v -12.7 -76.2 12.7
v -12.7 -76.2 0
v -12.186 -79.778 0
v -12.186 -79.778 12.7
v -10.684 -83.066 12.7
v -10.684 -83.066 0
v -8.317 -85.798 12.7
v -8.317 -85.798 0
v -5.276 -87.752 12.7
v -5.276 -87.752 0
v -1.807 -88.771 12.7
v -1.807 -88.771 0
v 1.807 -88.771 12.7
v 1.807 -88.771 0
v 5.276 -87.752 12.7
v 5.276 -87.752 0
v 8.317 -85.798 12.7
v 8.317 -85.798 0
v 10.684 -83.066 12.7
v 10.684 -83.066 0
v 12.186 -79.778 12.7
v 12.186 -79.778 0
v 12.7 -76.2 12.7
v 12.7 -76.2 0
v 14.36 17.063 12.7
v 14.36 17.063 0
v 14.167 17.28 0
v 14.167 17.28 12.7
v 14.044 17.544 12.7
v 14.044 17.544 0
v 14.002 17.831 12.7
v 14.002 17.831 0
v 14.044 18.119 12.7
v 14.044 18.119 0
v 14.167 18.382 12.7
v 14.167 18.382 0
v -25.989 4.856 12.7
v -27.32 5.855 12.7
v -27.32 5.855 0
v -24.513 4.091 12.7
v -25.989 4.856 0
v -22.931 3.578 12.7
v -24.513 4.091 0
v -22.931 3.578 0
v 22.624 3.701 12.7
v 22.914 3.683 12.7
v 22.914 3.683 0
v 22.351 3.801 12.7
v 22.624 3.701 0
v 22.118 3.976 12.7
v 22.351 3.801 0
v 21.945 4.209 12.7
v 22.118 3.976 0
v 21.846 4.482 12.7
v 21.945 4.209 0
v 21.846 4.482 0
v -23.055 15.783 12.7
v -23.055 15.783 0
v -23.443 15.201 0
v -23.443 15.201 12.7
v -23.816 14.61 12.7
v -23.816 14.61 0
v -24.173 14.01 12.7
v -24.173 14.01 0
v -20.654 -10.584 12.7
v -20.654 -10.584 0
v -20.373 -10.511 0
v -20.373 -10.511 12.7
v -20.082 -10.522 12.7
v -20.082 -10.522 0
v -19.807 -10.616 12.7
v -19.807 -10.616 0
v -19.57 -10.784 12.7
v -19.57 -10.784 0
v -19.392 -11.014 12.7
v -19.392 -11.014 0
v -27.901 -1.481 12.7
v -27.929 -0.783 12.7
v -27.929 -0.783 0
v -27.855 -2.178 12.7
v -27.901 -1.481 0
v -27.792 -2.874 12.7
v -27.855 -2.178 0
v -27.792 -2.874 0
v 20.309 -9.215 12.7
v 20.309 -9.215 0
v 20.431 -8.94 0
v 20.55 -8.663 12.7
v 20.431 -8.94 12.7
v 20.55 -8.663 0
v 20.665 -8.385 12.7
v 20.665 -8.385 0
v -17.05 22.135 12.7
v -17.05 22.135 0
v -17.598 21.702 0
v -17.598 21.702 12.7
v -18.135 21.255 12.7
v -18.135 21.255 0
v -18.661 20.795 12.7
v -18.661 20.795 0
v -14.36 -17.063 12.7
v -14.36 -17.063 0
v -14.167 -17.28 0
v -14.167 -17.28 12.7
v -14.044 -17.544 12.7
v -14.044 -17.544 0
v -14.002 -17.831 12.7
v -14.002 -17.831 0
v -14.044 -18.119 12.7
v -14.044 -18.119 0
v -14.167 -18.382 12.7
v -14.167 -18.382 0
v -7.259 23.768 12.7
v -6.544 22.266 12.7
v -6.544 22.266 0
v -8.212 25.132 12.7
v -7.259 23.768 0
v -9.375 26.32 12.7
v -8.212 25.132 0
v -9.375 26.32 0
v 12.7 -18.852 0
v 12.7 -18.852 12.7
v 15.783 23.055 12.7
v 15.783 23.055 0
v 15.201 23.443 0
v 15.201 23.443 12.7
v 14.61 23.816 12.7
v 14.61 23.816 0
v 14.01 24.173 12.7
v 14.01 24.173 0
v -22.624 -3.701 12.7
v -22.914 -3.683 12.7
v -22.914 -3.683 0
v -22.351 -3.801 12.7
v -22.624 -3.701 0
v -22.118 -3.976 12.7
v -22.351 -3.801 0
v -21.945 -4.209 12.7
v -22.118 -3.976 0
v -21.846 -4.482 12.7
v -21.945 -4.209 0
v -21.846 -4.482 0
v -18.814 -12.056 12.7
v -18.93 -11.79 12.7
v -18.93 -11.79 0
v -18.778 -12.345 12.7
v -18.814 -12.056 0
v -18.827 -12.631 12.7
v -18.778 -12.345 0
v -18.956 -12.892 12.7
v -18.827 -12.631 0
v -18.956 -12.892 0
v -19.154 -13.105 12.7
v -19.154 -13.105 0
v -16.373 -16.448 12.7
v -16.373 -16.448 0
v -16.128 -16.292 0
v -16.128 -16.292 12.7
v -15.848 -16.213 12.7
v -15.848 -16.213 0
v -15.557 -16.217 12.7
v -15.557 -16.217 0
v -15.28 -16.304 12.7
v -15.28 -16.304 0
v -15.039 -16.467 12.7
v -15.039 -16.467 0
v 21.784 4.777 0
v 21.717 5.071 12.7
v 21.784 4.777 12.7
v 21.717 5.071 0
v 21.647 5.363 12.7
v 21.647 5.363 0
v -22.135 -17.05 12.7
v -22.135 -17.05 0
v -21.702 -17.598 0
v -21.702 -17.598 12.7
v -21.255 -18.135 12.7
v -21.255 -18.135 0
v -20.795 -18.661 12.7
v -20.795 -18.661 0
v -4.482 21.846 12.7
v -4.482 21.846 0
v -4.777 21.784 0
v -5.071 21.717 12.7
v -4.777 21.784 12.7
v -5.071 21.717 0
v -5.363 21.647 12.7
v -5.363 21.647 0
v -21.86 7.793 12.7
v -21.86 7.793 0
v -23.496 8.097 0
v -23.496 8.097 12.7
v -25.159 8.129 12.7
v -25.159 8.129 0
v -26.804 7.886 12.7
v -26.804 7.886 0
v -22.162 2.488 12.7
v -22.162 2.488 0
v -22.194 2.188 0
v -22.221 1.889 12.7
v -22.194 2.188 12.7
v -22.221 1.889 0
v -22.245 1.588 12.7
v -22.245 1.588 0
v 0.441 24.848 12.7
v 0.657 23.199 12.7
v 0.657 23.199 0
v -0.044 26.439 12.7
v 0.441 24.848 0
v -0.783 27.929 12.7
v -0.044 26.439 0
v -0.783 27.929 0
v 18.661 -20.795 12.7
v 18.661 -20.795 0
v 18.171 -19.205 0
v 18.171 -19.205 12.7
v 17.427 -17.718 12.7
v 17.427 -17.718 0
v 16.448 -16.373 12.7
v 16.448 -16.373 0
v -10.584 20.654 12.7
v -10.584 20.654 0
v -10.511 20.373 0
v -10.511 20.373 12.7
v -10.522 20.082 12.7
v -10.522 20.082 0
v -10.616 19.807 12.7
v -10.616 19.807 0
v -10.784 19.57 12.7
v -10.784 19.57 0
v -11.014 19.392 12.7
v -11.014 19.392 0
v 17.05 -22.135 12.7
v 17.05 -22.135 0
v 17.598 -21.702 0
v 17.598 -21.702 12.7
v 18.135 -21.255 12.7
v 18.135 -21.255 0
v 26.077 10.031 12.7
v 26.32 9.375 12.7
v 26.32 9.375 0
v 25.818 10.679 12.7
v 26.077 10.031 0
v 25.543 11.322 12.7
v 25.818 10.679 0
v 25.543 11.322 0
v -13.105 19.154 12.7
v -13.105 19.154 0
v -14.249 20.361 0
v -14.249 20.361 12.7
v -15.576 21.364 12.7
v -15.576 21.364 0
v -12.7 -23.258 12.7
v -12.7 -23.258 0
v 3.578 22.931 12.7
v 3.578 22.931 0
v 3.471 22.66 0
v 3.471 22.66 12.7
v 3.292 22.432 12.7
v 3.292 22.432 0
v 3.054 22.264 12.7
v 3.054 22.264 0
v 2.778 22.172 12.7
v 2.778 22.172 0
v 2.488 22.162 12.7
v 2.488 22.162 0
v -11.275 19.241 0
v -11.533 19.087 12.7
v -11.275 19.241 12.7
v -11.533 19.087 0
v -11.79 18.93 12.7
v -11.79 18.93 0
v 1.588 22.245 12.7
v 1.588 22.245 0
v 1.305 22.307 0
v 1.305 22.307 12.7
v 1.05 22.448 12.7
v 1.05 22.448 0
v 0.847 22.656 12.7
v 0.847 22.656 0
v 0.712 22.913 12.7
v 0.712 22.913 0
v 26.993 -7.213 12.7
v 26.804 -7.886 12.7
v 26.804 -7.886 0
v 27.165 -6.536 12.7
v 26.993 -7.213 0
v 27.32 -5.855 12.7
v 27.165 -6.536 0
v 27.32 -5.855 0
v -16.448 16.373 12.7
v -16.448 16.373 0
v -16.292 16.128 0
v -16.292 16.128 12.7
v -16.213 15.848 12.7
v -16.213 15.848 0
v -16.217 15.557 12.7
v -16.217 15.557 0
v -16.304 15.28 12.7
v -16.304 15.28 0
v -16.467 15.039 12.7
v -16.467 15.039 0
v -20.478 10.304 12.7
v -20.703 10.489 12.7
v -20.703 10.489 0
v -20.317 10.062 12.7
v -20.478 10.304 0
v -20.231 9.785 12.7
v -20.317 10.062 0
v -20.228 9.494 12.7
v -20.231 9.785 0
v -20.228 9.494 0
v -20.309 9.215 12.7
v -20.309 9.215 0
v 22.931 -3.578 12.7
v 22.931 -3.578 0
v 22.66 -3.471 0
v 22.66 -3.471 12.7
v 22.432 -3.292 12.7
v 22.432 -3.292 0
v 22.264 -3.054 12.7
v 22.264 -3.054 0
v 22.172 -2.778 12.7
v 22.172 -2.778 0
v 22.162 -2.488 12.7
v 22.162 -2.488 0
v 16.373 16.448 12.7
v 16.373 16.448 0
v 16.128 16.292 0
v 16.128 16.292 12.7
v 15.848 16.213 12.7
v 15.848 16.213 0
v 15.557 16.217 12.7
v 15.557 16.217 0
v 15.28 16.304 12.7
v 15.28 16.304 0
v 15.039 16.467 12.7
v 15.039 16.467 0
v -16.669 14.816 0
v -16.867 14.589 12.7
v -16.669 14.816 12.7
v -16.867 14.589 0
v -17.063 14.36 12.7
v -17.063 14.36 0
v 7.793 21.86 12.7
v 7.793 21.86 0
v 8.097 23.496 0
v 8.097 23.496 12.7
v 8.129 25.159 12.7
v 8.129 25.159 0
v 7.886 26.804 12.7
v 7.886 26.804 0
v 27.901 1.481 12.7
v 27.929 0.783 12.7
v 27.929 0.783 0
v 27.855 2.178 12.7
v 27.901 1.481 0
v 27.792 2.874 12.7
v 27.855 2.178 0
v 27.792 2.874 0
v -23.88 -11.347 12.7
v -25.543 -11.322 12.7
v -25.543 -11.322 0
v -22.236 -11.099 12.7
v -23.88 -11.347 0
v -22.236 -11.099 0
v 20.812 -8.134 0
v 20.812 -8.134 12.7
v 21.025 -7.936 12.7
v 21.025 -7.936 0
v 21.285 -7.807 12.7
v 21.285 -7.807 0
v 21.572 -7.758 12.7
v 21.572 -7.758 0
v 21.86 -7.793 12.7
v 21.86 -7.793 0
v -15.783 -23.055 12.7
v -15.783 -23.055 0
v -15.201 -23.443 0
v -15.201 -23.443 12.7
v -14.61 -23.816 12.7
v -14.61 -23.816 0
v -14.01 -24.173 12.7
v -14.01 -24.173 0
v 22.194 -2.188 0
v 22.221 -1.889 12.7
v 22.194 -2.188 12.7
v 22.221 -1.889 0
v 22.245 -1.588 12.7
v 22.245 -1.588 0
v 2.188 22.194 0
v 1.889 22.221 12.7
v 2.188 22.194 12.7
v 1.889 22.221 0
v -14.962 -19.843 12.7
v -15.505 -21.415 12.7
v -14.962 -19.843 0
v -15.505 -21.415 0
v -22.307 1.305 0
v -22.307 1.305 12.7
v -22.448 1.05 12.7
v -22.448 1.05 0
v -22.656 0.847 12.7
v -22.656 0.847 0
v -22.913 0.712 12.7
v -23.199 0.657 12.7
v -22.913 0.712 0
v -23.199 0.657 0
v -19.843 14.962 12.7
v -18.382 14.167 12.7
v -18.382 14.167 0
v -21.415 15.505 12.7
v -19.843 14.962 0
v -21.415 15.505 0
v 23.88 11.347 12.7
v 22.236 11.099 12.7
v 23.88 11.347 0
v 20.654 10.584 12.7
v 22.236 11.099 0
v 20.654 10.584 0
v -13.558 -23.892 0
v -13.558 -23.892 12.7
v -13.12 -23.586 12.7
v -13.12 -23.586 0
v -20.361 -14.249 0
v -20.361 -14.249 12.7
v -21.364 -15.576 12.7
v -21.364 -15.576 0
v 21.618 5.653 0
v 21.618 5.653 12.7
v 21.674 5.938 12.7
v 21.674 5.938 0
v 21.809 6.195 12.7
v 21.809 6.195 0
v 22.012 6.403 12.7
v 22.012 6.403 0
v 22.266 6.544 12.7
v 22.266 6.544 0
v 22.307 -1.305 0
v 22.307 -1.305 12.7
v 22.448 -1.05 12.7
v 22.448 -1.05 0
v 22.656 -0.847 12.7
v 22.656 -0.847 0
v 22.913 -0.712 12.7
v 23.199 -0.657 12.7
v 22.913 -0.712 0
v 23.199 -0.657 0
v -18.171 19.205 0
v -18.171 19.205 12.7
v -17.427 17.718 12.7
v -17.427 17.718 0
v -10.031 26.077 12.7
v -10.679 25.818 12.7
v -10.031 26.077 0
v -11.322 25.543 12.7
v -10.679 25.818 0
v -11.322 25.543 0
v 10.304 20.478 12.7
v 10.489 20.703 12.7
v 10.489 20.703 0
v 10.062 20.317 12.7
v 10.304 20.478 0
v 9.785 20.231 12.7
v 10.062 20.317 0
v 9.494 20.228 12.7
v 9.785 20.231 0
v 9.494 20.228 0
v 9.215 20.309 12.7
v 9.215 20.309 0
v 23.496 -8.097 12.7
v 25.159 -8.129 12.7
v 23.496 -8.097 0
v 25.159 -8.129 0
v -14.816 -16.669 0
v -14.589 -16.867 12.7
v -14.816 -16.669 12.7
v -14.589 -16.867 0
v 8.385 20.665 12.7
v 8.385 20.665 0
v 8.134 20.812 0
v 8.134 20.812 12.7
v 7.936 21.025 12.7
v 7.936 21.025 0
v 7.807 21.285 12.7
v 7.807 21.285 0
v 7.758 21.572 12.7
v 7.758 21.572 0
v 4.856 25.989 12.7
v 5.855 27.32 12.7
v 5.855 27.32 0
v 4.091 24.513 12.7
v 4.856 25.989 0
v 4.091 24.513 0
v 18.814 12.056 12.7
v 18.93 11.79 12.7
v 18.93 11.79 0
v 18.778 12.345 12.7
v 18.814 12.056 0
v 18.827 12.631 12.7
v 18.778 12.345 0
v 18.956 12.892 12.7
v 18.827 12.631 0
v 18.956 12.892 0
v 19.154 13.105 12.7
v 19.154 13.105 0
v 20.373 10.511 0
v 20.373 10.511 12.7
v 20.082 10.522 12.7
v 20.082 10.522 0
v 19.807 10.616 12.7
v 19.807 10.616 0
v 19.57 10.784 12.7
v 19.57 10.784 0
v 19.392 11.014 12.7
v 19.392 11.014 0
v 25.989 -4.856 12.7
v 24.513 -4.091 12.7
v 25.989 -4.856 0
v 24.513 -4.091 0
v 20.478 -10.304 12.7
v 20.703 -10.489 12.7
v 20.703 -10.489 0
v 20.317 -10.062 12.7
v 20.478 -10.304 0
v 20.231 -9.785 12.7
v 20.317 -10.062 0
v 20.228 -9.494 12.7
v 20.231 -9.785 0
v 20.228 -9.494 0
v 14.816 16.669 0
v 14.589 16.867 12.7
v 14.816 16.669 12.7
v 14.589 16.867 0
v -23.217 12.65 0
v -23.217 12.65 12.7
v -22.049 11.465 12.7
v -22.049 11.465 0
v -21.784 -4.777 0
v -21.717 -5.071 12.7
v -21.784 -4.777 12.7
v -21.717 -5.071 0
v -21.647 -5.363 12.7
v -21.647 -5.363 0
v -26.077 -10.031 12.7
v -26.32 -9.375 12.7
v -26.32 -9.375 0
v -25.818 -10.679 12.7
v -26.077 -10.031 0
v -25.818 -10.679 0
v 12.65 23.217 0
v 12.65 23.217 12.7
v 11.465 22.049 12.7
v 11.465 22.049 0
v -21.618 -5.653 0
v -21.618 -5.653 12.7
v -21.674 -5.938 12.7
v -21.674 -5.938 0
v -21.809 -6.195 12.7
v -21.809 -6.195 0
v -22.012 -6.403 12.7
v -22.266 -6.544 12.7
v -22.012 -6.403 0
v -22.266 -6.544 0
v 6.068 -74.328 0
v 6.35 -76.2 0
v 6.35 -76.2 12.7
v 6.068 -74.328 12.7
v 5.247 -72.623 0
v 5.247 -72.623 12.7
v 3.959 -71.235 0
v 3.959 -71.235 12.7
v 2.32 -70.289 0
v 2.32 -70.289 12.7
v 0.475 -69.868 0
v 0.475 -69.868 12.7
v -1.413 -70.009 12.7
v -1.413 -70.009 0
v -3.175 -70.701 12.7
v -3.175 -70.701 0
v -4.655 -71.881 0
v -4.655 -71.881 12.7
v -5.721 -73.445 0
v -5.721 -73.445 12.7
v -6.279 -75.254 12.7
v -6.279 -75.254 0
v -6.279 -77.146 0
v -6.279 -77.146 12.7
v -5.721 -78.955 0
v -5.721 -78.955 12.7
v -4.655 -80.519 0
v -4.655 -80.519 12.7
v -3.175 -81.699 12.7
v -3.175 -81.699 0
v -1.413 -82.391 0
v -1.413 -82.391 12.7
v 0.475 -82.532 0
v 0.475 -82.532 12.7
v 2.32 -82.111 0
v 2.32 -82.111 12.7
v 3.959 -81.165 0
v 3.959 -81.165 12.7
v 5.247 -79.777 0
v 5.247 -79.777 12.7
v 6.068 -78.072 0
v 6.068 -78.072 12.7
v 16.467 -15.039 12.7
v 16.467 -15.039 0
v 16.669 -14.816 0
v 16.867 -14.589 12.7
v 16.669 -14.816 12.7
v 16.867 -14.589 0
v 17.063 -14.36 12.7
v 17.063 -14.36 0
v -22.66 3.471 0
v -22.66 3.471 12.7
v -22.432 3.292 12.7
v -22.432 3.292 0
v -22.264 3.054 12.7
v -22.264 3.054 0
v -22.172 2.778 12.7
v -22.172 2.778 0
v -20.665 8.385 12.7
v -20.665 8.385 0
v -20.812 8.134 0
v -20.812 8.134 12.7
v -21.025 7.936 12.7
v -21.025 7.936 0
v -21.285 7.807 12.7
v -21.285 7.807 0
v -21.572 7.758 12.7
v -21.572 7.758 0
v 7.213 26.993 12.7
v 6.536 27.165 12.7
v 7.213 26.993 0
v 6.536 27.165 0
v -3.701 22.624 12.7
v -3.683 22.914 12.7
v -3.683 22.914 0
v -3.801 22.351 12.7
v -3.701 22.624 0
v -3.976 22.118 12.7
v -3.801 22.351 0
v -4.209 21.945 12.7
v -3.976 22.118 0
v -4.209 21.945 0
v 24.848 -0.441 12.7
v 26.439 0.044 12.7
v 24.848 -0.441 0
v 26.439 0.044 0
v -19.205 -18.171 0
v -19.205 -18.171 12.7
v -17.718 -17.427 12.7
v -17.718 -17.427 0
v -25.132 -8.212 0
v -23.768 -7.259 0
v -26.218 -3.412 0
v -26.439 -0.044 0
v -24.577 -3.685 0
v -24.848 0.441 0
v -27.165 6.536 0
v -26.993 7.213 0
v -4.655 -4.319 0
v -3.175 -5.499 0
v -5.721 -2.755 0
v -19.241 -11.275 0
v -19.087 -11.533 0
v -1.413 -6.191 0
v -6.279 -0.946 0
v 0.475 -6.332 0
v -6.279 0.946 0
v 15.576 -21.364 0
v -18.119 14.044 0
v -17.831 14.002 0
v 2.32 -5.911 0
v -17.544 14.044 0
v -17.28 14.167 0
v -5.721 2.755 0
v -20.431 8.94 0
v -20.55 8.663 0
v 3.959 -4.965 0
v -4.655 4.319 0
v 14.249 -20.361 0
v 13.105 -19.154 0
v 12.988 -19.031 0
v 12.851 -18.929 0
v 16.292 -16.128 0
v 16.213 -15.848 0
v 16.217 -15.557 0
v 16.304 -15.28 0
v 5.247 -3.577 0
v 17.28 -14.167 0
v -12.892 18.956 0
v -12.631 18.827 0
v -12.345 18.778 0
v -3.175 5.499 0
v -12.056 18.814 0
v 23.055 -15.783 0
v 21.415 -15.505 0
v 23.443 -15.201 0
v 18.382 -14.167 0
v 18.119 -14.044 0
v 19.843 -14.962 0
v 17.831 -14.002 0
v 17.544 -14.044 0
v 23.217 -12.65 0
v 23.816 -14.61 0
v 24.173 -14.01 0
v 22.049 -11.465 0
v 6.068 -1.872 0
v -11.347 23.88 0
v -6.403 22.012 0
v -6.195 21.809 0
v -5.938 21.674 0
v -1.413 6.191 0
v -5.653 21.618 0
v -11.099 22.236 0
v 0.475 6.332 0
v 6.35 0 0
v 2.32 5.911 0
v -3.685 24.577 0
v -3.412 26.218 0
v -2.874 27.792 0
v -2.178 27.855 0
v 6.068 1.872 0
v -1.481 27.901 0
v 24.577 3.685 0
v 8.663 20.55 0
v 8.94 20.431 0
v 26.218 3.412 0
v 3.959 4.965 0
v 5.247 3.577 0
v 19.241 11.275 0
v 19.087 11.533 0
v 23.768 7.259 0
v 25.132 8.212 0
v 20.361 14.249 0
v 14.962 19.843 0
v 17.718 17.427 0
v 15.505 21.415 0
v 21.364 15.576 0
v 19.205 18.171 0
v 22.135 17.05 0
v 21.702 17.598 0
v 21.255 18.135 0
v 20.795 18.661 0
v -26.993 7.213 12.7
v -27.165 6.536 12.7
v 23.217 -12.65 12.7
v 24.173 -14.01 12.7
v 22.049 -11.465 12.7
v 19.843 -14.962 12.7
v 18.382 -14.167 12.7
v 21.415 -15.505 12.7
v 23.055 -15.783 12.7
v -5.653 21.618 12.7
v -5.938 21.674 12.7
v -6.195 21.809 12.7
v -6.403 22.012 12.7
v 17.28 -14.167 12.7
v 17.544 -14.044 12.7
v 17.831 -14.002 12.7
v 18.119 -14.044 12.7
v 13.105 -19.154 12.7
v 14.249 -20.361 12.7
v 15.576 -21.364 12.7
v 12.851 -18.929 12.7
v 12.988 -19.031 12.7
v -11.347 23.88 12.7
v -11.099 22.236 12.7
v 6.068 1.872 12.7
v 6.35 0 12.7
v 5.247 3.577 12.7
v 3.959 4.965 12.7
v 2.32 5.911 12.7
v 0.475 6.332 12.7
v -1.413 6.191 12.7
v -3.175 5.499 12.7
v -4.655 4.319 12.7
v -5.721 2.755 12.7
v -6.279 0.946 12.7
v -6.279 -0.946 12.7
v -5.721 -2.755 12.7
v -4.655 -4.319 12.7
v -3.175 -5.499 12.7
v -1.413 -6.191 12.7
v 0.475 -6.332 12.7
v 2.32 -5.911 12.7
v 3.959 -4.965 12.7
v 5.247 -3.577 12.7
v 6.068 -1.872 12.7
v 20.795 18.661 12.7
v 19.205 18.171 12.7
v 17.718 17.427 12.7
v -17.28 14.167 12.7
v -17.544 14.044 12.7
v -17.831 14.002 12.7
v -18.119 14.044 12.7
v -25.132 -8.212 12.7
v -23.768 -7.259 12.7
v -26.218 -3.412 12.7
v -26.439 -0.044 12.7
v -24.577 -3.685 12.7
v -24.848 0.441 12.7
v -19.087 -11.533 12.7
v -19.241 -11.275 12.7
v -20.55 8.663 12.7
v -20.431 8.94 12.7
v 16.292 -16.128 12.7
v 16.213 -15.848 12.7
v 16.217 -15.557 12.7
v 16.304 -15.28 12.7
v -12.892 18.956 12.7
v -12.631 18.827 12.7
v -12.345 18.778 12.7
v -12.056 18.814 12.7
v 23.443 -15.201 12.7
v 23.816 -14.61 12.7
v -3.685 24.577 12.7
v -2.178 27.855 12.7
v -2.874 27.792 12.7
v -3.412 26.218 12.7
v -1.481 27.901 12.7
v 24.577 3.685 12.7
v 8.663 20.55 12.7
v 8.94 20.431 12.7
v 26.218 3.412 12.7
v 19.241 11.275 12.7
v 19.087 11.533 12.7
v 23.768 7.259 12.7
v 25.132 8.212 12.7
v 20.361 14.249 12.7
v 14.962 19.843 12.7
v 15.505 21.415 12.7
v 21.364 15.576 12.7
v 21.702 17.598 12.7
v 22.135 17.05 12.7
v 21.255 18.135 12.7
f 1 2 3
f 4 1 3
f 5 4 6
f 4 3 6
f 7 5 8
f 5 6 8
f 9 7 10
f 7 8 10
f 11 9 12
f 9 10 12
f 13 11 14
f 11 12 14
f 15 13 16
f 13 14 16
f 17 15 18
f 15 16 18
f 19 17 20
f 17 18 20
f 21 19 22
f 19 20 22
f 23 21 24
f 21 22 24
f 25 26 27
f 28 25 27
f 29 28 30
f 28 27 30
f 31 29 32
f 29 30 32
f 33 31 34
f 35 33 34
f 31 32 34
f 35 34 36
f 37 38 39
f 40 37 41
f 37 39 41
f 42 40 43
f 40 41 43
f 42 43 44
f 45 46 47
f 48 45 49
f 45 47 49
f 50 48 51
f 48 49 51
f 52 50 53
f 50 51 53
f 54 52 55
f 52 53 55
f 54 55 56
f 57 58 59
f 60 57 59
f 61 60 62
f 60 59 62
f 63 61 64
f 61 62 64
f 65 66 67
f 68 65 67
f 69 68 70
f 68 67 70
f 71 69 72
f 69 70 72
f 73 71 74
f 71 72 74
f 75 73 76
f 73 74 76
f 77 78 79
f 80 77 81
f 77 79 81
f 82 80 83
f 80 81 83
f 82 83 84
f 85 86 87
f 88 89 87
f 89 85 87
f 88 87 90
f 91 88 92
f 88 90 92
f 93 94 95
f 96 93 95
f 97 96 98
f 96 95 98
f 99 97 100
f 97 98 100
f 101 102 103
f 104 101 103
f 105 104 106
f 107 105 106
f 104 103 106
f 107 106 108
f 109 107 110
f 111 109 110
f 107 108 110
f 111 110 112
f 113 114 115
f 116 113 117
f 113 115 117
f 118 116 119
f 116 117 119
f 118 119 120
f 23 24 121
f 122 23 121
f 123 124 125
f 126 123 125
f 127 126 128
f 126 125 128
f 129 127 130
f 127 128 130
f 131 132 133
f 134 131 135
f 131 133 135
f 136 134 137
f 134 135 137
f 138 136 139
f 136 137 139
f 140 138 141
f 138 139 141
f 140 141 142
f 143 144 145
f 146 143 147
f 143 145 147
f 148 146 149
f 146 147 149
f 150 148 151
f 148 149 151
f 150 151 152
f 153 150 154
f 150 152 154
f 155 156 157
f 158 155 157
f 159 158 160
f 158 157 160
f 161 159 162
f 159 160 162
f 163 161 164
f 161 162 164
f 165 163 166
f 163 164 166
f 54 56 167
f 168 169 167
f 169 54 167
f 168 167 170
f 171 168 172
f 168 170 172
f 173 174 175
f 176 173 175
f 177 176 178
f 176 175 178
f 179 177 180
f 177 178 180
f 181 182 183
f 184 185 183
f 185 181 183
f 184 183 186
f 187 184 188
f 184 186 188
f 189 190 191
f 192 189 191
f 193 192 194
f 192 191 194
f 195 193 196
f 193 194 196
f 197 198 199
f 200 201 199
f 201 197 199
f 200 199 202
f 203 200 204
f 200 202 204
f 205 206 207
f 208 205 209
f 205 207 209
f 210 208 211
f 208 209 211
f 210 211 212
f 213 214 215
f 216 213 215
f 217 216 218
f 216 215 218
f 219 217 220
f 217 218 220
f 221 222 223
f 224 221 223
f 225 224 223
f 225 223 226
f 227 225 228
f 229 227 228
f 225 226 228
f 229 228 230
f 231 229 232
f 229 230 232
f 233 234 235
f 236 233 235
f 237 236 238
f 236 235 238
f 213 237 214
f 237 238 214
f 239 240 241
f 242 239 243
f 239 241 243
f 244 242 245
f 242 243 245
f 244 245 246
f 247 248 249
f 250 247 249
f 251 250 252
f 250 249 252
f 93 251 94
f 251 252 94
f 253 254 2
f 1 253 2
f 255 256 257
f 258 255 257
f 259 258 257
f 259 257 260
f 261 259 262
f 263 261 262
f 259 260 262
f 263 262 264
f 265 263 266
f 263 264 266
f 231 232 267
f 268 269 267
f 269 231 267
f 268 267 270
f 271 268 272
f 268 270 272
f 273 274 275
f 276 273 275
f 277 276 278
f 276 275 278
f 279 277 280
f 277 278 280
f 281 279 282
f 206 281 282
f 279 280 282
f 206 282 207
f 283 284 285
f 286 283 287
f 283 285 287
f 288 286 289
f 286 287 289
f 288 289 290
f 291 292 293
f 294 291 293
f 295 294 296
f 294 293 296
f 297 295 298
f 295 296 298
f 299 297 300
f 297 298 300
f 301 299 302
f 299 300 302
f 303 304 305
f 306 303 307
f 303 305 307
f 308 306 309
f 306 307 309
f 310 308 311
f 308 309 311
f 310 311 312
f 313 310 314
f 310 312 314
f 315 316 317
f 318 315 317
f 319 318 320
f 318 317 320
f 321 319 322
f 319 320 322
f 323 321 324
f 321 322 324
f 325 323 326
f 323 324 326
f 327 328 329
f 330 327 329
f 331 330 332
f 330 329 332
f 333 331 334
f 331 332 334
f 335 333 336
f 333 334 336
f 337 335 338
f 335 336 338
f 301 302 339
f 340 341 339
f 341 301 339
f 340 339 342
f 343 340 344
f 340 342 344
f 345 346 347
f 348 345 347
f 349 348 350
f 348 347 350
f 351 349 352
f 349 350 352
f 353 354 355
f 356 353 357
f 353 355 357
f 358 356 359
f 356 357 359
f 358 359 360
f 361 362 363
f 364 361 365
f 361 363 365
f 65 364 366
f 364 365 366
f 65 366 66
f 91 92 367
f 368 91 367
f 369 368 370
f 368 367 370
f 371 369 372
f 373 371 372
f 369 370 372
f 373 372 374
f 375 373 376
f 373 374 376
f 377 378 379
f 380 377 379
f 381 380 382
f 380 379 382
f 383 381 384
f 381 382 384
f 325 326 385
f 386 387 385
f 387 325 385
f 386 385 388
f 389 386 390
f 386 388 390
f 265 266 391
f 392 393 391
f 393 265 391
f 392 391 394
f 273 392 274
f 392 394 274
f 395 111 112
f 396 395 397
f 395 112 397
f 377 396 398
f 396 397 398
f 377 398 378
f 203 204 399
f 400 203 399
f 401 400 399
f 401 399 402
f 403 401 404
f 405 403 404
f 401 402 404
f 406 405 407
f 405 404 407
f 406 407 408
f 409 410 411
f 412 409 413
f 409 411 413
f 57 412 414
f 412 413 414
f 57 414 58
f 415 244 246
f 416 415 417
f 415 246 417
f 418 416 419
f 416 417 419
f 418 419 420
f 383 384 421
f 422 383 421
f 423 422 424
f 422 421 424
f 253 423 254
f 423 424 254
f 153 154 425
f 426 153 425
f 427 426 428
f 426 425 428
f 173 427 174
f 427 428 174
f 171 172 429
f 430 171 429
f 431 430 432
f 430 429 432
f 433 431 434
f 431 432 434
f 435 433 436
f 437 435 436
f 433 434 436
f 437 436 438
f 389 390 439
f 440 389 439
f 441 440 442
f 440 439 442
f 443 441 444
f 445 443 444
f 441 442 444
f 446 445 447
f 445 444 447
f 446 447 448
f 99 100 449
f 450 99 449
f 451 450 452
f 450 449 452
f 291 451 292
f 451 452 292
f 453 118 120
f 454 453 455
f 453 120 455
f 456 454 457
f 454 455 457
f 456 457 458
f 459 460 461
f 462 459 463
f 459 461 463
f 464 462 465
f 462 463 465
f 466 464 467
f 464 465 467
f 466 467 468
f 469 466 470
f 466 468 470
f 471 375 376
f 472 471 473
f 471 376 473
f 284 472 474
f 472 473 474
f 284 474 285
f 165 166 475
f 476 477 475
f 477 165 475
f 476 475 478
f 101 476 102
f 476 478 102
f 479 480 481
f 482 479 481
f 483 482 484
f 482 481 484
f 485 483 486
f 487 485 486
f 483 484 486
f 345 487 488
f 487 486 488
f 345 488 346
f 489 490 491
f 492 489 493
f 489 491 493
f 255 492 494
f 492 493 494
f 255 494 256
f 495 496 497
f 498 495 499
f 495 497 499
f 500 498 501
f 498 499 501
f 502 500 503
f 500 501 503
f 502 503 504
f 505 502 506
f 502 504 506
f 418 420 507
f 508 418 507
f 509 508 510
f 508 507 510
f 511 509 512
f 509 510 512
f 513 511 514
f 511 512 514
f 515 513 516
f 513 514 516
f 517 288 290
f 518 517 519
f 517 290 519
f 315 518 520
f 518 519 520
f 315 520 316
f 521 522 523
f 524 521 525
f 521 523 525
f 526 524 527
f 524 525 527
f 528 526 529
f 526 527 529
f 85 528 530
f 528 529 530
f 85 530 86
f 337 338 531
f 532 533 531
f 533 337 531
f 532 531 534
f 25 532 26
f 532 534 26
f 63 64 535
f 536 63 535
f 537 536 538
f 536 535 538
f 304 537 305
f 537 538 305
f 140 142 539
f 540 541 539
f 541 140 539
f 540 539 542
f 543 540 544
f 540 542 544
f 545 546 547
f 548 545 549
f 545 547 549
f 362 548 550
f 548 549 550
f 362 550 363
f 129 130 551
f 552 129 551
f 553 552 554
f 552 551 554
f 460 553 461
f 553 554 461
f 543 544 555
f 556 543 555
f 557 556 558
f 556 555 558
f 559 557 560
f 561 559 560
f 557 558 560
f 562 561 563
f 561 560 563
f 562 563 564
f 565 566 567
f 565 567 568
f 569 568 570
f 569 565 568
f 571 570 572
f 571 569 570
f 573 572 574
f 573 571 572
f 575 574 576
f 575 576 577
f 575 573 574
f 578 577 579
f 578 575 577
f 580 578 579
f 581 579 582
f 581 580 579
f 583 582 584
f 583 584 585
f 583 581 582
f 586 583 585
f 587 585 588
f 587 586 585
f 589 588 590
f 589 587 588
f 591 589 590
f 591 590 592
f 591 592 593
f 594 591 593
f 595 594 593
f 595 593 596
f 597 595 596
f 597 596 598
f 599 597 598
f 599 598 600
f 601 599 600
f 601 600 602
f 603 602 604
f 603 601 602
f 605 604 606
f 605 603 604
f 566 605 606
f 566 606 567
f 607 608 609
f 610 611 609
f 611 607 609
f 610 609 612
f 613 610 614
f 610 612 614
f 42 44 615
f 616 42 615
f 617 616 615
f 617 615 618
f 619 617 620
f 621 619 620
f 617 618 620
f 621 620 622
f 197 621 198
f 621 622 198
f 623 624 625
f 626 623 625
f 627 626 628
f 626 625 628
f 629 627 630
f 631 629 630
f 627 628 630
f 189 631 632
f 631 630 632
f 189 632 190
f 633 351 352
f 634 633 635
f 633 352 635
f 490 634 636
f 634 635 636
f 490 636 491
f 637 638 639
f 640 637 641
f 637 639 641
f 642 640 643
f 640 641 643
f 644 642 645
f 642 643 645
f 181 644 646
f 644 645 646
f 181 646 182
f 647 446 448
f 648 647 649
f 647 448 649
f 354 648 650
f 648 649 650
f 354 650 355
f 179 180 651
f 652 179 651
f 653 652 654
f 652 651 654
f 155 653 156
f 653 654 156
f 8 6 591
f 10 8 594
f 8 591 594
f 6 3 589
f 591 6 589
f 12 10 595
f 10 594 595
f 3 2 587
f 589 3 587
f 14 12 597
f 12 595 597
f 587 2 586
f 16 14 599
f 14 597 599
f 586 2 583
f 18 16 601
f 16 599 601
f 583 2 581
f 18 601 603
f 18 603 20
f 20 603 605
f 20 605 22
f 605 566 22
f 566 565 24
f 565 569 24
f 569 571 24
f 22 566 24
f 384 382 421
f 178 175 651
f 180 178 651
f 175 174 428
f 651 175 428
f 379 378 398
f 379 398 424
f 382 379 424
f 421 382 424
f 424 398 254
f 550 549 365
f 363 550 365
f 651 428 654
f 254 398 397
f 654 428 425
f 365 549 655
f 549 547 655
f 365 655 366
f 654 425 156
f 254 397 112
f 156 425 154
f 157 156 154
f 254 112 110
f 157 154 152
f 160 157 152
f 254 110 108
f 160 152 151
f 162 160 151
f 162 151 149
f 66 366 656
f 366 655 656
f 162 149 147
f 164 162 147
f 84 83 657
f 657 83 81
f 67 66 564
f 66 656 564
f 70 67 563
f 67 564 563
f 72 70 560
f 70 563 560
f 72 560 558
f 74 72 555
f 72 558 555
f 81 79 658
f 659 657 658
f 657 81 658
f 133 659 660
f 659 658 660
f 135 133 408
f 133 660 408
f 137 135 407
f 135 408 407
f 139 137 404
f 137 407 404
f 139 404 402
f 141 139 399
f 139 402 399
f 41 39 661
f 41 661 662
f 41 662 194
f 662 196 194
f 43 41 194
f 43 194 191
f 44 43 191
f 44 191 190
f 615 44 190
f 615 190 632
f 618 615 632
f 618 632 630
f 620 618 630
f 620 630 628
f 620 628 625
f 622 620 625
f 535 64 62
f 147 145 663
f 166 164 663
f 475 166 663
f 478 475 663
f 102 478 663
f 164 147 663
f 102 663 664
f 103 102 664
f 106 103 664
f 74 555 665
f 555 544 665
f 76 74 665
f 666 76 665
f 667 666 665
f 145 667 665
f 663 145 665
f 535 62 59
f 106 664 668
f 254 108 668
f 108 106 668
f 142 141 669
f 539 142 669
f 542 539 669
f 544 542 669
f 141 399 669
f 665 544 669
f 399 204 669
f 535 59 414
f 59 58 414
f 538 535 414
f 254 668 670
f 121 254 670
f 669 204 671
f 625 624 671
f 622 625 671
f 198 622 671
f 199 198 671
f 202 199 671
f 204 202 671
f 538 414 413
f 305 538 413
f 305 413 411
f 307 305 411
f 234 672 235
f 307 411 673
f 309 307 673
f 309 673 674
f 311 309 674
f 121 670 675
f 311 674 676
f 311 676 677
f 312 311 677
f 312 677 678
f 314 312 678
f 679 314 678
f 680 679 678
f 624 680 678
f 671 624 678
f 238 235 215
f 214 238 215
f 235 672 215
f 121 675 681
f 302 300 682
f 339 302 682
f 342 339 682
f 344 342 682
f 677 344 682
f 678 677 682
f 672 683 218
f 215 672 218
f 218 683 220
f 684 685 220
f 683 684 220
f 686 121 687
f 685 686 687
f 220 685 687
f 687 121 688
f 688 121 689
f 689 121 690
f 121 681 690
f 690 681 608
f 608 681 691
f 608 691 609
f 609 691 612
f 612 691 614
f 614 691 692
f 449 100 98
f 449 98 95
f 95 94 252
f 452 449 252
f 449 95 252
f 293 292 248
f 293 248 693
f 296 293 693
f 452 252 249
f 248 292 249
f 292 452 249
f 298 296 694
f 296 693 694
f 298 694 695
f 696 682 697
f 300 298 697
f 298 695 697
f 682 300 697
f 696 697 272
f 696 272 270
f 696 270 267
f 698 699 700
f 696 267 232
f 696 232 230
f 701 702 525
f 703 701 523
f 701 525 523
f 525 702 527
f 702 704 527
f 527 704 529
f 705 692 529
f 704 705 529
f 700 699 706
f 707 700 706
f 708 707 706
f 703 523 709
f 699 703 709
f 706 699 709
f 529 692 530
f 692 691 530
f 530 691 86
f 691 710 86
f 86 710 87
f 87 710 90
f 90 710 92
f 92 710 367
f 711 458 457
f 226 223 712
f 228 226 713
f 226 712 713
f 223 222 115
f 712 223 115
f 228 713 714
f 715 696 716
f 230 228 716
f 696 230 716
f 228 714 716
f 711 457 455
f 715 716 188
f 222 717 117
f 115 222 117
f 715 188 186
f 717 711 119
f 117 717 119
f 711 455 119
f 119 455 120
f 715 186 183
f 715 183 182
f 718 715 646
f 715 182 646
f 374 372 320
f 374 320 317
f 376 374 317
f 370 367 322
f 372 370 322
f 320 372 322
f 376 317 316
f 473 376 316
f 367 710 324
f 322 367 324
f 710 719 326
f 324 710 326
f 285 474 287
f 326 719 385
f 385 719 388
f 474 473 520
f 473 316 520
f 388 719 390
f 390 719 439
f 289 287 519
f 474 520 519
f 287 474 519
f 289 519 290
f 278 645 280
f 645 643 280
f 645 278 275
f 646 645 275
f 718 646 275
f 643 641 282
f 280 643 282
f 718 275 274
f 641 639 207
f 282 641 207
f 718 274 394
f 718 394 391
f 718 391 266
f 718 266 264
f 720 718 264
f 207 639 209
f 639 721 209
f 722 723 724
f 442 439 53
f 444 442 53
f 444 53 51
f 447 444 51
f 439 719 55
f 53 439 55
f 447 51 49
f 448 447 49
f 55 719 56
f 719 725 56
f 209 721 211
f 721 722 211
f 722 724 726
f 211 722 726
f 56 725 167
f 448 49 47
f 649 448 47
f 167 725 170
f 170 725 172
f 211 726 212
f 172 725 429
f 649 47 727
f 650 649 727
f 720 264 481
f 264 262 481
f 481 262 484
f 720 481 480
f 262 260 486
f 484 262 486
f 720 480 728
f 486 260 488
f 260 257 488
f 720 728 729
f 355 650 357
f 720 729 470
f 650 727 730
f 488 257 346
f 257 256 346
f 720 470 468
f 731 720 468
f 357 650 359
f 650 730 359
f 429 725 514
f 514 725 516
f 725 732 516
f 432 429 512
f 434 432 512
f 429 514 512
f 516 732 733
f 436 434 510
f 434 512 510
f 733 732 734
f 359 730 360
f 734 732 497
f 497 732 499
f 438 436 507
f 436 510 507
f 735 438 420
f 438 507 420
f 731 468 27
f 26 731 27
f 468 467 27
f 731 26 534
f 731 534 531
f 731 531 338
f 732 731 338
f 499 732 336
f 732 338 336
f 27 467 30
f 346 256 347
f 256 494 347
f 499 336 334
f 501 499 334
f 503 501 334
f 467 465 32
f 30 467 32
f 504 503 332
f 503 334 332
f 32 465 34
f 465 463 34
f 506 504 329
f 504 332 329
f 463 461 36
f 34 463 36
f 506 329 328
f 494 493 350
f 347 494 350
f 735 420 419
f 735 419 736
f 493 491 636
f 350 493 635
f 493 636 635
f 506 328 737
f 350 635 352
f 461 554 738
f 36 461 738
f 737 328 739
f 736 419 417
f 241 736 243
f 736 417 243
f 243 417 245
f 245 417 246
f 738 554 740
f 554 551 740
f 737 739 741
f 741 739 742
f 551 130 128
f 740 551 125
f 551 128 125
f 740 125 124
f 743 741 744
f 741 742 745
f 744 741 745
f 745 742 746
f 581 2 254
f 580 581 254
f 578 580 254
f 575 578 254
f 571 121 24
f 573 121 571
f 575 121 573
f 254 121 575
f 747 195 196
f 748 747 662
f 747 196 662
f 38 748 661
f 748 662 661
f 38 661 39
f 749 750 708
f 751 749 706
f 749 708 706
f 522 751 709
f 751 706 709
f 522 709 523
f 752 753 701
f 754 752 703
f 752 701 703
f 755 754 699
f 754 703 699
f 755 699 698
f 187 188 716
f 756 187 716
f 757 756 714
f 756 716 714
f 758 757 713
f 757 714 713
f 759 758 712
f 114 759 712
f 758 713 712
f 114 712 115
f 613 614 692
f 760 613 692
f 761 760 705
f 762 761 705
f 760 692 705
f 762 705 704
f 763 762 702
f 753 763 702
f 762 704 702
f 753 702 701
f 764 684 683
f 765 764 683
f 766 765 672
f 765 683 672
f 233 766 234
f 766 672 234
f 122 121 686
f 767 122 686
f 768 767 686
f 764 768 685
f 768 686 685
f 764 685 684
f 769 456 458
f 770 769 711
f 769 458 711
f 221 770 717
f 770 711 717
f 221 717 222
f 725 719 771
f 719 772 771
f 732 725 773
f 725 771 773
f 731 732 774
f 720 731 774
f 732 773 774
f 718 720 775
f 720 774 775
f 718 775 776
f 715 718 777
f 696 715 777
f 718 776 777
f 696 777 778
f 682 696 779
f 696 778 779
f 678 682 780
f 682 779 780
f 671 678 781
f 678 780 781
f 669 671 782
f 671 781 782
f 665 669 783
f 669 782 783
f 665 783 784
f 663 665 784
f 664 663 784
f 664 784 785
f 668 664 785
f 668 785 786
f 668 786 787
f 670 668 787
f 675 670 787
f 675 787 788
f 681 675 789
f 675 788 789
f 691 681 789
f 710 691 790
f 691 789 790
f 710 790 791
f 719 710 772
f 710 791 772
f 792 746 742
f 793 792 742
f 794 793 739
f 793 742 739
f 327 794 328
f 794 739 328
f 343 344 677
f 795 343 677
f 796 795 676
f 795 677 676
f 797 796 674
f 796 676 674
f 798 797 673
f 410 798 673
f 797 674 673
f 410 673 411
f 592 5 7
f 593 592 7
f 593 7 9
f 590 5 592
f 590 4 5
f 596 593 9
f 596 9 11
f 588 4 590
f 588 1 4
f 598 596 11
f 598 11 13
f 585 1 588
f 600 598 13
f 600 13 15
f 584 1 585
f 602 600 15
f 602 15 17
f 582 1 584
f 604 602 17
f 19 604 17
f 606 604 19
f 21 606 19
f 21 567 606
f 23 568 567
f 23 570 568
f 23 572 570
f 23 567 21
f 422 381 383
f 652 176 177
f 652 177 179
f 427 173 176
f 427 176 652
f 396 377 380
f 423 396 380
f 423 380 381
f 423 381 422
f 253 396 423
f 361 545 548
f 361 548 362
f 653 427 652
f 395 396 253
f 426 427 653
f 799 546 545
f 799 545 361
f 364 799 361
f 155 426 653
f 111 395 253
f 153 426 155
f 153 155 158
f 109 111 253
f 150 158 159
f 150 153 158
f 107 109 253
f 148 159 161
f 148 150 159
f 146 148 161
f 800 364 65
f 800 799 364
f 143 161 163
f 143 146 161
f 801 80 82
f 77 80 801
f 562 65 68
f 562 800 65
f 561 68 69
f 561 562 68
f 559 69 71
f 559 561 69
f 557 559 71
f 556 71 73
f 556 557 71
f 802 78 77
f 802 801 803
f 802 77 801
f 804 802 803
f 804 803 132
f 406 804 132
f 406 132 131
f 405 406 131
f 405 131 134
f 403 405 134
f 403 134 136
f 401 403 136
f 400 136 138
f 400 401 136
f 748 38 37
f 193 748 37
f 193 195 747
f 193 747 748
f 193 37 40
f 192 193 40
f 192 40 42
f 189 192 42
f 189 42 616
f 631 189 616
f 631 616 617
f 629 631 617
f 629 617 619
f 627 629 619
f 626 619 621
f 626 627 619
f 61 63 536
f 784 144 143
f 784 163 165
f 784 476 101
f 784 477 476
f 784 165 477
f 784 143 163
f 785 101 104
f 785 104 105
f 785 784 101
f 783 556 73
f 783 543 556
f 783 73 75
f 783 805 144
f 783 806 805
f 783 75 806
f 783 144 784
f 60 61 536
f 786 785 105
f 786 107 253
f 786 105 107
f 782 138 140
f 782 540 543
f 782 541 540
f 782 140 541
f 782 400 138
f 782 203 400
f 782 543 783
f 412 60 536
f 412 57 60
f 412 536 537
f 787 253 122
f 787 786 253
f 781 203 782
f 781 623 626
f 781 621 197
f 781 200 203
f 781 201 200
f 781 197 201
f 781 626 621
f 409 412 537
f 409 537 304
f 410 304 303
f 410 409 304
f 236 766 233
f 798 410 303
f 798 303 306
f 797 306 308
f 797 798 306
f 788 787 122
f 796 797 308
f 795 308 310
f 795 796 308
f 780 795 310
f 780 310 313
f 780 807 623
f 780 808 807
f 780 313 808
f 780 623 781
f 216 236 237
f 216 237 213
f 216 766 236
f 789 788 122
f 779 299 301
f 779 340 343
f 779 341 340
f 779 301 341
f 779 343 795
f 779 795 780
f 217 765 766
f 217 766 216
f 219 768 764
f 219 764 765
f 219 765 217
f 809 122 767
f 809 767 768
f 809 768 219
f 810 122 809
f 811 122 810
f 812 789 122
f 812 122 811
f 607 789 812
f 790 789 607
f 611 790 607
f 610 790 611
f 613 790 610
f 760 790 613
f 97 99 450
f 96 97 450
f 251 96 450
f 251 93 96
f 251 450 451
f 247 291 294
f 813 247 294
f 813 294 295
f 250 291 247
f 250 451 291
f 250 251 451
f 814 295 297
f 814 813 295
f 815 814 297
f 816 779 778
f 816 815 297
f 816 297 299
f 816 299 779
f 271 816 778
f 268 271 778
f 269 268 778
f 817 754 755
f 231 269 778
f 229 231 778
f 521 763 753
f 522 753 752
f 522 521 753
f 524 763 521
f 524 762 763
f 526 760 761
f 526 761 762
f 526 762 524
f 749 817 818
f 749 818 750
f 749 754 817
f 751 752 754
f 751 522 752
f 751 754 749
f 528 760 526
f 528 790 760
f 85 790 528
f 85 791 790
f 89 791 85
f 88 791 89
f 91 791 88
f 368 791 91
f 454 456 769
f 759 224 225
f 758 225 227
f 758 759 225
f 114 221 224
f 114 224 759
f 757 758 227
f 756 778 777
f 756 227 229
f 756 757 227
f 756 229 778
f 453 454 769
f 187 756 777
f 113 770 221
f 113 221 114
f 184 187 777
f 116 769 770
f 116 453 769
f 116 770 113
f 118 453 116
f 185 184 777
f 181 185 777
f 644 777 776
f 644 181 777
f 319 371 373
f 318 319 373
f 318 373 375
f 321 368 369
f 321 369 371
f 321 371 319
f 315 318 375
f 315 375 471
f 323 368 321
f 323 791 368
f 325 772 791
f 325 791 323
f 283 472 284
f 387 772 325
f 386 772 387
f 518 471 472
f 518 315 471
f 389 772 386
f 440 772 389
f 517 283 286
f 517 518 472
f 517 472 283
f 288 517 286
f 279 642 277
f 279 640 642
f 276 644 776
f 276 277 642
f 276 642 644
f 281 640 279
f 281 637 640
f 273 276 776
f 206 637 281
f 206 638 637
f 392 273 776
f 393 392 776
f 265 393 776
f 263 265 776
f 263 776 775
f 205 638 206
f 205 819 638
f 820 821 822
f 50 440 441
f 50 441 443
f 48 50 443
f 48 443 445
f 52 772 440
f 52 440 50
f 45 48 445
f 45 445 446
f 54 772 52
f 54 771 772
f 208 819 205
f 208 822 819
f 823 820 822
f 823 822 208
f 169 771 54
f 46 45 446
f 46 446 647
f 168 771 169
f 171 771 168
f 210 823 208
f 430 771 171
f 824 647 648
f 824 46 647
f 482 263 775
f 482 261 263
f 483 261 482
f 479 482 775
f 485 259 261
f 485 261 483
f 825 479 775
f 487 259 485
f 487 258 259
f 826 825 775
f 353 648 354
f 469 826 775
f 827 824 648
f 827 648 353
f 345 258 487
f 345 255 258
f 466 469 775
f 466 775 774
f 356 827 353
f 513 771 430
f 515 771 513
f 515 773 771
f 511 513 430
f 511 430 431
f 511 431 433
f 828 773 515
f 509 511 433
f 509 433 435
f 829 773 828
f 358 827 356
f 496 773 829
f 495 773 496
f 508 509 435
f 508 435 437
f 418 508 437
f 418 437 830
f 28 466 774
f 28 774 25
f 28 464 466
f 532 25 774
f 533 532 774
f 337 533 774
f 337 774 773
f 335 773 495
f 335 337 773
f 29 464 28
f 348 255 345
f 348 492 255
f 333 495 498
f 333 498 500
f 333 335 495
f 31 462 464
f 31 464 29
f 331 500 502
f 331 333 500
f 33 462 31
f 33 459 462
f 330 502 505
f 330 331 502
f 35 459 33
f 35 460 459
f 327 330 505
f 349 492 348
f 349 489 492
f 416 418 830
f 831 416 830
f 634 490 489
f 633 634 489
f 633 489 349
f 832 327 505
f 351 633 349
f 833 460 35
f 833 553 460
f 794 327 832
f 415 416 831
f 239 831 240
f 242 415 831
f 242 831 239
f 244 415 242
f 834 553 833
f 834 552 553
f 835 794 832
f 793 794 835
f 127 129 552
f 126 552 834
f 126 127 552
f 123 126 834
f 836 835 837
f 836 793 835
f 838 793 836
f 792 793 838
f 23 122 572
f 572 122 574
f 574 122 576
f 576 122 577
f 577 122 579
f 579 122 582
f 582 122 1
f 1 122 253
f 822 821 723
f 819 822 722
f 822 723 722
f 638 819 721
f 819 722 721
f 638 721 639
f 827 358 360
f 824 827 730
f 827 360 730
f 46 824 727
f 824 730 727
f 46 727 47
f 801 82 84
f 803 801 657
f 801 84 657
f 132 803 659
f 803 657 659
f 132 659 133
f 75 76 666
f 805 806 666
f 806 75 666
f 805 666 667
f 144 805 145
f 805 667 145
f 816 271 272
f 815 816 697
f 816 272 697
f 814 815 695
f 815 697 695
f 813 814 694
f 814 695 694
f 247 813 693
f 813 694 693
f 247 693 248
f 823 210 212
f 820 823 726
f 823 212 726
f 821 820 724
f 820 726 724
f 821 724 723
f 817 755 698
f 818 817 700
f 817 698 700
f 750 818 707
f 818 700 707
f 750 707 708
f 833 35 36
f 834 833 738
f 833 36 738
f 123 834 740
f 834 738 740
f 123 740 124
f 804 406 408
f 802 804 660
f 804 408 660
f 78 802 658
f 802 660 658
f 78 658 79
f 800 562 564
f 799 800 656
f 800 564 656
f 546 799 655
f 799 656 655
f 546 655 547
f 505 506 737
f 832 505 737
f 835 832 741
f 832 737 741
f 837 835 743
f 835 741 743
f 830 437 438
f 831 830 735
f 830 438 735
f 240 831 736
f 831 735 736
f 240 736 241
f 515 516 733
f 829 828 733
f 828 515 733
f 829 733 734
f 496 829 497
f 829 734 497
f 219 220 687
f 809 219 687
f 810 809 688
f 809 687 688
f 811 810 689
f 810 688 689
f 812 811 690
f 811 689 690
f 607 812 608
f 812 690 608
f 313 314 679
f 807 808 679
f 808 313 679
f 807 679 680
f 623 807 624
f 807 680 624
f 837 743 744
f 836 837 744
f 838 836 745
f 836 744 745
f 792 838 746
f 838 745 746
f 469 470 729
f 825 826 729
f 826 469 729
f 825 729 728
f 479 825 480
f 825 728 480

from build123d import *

# Parameters (mm, degrees)
SKETCH3_R           = 27.94
GEARBODY_DEPTH      = 12.7
TOOTHCUT_DEPTH      = 13.7
CIRPATTERN1_COUNT   = 20
BOREDIA_R           = 6.35
BORE_DEPTH          = 12700
SKETCH4_R           = 6.35
BOSS_EXTRUDE1_DEPTH = 12.7


with BuildPart() as part:
    # Sketch3 → gearBody (new body)
    with BuildSketch(Plane.XY):
        Circle(SKETCH3_R)
    extrude(amount=GEARBODY_DEPTH)

    # Sketch2 → toothCut (cut, through all)
    with BuildSketch(Plane.XY):
        with BuildLine():
            ThreePointArc((22.161994813, -2.487872048), (22.207832173, -2.038556256), (22.244560977, -1.58840435))
            ThreePointArc((22.244560977, -1.58840435), (22.544698475, -0.941259068), (23.198766614, -0.656523398))
            ThreePointArc((23.198766614, -0.656523398), (27.638401864, 0.614170289), (31.045266607, 3.731588487))
            ThreePointArc((31.045266607, 3.731588487), (31.137815759, -2.858279396), (29.847095445, -9.321170787))
            ThreePointArc((29.847095445, -9.321170787), (27.064706273, -5.635613286), (22.930600611, -3.577897568))
            ThreePointArc((22.930600611, -3.577897568), (22.339300546, -3.17884398), (22.161994813, -2.487872048))
        make_face()
    toothcut = extrude(amount=TOOTHCUT_DEPTH, mode=Mode.SUBTRACT)

    # CirPattern1: toothCut ×20 about axis
    cirpattern1_axis = Axis((0, 0, 0), (0, 0, 1))
    for i in range(1, CIRPATTERN1_COUNT):
        add(toothcut.rotate(cirpattern1_axis, i * 360 / CIRPATTERN1_COUNT), mode=Mode.SUBTRACT)

    # boreDia → bore (cut, symmetric)
    with BuildSketch(Plane.XY):
        Circle(BOREDIA_R)
    extrude(amount=BORE_DEPTH, both=True, mode=Mode.SUBTRACT)

    # Sketch4 → Boss-Extrude1 (add)
    with BuildSketch(Plane.XY):
        with BuildLine():
            Line((-12.7, -18.331762639), (-12.7, -76.2))
            ThreePointArc((-12.7, -76.2), (0, -88.9), (12.7, -76.2))
            Line((12.7, -76.2), (12.7, -18.331762639))
            ThreePointArc((12.7, -18.331762639), (0, -22.3012), (-12.7, -18.331762639))
        make_face()
        with Locations((0, -76.2)):
            Circle(SKETCH4_R, mode=Mode.SUBTRACT)
    extrude(amount=BOSS_EXTRUDE1_DEPTH)


solid = part.part
